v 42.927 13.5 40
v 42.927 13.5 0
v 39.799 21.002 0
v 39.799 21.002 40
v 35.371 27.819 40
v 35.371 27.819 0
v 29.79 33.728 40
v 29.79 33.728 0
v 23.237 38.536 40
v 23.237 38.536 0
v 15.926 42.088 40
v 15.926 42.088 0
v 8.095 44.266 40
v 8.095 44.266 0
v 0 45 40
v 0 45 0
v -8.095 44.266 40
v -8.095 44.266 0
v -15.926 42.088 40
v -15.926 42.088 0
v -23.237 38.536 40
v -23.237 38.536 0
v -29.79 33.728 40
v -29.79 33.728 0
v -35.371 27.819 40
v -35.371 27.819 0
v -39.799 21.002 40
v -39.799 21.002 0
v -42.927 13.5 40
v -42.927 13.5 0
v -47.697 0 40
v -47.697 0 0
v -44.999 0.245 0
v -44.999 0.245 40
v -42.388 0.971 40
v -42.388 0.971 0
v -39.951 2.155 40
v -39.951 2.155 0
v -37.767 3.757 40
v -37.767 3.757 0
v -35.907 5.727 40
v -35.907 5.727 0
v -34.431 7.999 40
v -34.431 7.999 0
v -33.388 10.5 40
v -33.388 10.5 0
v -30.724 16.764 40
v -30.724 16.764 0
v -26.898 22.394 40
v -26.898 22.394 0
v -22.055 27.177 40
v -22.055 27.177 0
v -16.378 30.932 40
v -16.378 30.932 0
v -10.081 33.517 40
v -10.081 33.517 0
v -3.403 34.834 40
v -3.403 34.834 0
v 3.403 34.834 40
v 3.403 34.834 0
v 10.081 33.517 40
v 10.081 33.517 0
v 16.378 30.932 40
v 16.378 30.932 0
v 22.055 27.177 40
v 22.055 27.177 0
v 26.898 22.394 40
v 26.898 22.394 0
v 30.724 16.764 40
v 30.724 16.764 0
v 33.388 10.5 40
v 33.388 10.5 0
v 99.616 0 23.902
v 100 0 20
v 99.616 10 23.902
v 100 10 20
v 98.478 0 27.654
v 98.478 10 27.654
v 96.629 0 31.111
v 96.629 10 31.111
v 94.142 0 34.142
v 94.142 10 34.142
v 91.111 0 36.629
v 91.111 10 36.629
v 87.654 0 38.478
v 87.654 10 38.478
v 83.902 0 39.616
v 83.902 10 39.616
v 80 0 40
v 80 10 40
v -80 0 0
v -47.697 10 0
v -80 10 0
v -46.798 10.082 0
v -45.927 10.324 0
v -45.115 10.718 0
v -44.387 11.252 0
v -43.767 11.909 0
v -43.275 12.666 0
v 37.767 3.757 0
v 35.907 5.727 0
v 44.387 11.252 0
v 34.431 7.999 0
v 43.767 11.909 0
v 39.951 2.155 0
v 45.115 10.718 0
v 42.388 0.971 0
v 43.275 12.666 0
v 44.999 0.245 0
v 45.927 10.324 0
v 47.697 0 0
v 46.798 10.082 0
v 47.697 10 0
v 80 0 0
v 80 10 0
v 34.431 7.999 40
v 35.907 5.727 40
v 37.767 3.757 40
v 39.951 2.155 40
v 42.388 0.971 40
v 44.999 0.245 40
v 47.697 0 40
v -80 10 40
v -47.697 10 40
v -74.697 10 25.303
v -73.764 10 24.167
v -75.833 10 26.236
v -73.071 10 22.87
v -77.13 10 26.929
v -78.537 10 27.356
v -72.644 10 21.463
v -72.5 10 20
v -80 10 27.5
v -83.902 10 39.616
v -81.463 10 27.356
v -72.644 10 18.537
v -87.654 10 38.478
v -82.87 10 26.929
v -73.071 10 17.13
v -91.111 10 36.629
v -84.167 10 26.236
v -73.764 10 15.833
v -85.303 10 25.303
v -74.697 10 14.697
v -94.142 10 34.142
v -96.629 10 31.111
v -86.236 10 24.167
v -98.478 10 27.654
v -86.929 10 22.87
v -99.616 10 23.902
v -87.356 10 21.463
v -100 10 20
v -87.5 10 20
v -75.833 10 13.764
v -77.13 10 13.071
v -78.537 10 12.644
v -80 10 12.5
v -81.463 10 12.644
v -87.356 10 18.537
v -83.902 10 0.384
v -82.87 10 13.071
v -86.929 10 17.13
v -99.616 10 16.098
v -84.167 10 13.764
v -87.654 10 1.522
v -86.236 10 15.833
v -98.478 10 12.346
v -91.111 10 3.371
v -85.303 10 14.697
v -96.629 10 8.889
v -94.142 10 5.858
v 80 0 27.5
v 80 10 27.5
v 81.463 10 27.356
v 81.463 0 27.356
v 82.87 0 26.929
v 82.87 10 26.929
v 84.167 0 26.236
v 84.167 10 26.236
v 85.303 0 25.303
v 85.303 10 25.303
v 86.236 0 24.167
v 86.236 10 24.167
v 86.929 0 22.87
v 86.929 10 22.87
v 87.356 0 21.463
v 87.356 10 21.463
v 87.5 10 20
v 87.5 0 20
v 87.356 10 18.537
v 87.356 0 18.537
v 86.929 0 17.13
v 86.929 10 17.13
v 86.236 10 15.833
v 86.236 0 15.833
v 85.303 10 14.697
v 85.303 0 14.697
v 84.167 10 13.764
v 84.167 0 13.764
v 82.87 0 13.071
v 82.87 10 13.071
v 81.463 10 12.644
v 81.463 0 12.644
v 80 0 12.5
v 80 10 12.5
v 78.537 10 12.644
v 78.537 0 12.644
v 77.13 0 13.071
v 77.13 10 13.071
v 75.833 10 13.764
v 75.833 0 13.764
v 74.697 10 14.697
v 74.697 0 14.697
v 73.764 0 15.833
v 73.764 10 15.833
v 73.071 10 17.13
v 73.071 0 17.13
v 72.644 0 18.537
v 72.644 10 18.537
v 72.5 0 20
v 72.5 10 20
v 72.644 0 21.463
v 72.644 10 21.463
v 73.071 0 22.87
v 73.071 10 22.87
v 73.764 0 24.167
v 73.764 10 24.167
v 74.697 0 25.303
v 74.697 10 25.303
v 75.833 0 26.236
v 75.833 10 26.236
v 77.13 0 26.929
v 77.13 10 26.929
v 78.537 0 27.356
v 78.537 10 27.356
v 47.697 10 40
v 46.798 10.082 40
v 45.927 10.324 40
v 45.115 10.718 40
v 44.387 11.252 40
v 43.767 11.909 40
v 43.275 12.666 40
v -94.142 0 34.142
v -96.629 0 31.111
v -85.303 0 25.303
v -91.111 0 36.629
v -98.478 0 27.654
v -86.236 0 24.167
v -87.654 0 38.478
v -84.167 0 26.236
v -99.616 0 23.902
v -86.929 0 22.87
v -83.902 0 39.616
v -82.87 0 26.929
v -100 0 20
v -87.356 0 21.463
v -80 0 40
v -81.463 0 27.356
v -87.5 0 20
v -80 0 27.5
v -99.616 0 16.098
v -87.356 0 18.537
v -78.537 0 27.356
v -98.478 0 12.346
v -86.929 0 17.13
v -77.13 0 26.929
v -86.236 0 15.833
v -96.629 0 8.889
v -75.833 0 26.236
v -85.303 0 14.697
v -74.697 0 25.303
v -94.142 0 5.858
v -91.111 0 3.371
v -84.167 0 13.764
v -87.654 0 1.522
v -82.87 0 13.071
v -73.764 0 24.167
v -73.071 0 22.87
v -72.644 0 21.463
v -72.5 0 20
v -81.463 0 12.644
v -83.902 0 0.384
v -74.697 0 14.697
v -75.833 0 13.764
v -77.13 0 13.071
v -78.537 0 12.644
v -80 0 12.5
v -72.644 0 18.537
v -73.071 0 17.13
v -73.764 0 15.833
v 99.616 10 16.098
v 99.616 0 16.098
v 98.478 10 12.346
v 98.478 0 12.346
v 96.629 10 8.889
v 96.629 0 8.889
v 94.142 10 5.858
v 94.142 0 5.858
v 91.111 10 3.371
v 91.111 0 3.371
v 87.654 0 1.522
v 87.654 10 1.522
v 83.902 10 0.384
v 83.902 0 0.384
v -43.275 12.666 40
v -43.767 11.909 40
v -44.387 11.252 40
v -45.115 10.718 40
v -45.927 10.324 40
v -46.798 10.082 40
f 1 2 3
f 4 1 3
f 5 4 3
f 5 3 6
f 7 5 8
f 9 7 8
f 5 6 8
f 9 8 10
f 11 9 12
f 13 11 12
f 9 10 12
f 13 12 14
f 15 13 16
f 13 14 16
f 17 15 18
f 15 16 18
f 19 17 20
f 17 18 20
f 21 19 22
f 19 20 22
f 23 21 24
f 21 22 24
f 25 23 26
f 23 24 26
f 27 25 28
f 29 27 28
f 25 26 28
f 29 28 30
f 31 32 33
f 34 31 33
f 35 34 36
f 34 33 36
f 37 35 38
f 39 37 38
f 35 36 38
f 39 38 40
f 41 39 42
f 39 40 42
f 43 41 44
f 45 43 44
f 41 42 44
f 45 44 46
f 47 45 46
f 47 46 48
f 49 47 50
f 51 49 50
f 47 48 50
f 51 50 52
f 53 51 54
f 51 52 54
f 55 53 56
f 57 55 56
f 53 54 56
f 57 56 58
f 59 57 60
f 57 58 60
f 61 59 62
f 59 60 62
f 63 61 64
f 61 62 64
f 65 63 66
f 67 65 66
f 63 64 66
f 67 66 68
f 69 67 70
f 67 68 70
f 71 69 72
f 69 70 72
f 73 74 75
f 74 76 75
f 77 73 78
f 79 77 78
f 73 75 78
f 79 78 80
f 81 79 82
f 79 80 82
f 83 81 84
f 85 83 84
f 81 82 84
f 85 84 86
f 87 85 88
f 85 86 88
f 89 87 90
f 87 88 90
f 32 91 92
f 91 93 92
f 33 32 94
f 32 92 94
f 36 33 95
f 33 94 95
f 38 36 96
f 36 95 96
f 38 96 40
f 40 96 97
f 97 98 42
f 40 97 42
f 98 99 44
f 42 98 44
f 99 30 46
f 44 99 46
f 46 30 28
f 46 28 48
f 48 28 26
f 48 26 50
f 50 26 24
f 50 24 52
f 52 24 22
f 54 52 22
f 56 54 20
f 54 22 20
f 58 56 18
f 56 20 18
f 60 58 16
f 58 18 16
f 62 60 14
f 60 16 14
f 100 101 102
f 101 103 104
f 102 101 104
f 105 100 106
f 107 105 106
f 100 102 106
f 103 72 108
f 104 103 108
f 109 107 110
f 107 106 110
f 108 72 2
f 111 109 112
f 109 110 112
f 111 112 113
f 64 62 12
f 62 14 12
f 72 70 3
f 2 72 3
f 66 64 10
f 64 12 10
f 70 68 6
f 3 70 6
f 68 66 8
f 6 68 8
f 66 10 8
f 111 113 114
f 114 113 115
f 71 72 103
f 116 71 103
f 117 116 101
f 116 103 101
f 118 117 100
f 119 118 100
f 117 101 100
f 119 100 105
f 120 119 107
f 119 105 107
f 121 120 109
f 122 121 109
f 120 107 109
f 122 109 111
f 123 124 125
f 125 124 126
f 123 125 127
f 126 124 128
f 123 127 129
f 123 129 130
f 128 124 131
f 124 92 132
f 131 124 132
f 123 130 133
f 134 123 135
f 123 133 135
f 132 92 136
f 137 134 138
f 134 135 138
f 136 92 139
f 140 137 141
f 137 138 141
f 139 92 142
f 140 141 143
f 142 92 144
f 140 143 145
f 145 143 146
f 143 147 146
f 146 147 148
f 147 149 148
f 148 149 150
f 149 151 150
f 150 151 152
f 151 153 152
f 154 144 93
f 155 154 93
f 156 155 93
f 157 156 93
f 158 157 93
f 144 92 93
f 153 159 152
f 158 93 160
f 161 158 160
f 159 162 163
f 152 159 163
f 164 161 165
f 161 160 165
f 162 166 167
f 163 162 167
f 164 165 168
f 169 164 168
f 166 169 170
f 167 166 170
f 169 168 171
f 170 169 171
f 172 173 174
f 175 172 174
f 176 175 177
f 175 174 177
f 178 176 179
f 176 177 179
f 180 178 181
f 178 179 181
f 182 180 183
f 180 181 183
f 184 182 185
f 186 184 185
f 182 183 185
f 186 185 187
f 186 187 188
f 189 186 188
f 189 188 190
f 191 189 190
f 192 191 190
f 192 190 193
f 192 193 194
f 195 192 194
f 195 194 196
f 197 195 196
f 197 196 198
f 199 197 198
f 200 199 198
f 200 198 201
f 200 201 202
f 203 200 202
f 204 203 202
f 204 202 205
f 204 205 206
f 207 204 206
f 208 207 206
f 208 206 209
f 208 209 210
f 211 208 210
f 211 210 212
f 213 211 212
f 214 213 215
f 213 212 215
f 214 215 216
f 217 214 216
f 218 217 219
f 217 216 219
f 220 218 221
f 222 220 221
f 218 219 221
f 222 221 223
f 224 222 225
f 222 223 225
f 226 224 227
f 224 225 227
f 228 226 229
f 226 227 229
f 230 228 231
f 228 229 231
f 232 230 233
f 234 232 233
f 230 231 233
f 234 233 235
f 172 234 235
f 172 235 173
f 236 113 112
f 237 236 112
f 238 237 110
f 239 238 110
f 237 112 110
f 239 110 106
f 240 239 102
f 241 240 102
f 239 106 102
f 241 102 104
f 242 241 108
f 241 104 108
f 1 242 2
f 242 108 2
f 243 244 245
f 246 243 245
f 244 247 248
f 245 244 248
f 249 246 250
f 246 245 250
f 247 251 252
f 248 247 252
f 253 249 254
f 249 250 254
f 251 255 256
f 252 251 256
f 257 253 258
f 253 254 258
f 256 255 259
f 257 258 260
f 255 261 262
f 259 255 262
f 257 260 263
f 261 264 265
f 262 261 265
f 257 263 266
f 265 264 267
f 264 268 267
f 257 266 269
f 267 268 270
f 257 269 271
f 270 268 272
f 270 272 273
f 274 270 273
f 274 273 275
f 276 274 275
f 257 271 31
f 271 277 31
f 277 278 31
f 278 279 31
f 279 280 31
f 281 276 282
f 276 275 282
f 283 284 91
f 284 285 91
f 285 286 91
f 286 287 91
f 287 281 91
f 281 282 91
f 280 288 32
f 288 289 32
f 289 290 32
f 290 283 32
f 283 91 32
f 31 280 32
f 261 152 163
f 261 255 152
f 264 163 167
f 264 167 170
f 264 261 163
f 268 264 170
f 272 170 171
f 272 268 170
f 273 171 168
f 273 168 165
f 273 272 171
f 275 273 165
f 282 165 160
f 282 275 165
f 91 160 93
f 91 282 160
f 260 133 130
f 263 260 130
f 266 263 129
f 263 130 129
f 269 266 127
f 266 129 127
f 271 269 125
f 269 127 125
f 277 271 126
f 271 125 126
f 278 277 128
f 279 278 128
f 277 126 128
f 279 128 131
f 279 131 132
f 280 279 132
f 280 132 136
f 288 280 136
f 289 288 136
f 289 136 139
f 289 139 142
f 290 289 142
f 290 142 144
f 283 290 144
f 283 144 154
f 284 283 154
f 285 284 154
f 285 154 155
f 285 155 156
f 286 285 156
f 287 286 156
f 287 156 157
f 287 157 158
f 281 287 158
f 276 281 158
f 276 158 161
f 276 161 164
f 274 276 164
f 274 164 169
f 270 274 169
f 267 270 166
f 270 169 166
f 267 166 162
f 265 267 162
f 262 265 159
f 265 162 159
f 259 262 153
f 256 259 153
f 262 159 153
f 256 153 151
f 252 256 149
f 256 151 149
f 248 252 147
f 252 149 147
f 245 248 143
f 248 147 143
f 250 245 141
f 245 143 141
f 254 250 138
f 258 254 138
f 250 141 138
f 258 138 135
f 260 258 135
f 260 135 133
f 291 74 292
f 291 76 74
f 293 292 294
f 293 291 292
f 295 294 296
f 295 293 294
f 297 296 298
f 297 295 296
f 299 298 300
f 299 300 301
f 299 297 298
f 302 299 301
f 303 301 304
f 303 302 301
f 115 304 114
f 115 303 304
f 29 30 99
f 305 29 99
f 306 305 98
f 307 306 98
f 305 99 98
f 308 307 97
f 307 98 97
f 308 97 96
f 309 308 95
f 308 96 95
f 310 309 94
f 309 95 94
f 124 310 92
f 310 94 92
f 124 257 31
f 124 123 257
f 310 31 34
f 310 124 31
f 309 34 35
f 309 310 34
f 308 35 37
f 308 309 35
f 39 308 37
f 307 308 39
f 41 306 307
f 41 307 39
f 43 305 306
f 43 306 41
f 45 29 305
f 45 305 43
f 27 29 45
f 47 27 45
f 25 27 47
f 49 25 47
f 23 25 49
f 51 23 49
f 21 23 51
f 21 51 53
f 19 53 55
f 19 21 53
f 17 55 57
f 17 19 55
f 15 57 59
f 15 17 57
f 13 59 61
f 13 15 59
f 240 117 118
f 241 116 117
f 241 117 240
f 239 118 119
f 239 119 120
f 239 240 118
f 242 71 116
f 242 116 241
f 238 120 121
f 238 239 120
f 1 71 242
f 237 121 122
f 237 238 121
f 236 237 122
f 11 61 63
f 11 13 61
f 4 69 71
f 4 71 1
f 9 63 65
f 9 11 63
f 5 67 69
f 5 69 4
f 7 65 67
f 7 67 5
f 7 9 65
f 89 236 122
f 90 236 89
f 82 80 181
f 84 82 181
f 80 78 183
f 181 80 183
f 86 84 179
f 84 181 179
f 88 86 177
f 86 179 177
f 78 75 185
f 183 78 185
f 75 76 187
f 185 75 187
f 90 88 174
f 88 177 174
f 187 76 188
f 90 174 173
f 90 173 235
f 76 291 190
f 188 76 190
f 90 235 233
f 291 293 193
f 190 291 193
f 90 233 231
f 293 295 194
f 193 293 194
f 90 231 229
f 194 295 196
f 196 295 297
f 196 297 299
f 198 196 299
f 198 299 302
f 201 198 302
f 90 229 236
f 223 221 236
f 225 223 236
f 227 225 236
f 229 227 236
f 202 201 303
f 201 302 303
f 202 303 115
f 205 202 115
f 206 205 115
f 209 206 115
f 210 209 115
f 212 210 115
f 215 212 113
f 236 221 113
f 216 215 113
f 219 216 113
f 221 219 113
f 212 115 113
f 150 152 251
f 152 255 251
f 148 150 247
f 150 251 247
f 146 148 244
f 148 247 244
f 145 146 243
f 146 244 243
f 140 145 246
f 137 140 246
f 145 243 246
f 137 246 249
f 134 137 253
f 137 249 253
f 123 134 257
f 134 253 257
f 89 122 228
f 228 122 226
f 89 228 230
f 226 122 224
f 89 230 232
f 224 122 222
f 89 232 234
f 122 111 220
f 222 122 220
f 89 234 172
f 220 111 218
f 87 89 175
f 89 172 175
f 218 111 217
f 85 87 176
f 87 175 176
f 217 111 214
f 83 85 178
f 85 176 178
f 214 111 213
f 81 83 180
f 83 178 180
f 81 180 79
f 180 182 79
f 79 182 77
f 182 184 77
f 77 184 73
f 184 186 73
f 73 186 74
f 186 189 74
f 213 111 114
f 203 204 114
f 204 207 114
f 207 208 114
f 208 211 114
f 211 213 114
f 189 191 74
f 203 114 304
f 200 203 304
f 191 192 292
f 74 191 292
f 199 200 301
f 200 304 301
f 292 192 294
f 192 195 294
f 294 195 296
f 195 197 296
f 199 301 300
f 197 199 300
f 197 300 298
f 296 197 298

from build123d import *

# Parameters (mm, degrees)
BOSS_EXTRUDE1_DEPTH = 40
FILLET1_R           = 20
SKETCH2_R           = 7.5
CUT_EXTRUDE1_DEPTH  = 114.247516529


with BuildPart() as part:
    # Sketch1 → Boss-Extrude1 (new body)
    with BuildSketch(Plane.XY):
        with BuildLine():
            Line((-100, 0), (-47.696960071, 0))
            ThreePointArc((-47.696960071, 0), (-38.822840396, 2.906613378), (-33.38787205, 10.5))
            ThreePointArc((-33.38787205, 10.5), (0, 35), (33.38787205, 10.5))
            ThreePointArc((33.38787205, 10.5), (38.822840396, 2.906613378), (47.696960071, 0))
            Line((47.696960071, 0), (100, 0))
            Line((100, 0), (100, 10))
            Line((100, 10), (47.696960071, 10))
            ThreePointArc((47.696960071, 10), (44.738920179, 10.968871126), (42.927264064, 13.5))
            ThreePointArc((42.927264064, 13.5), (0, 45), (-42.927264064, 13.5))
            ThreePointArc((-42.927264064, 13.5), (-44.738920179, 10.968871126), (-47.696960071, 10))
            Line((-47.696960071, 10), (-100, 10))
            Line((-100, 10), (-100, 0))
        make_face()
    extrude(amount=BOSS_EXTRUDE1_DEPTH)

    # Fillet1
    fillet1_edges = [part.edges().sort_by_distance(p)[0] for p in [
        (100, 5, 0),
        (100, 5, 40),
        (-100, 5, 0),
        (-100, 5, 40),
    ]]
    fillet(fillet1_edges, radius=FILLET1_R - 0.0001)  # a hair under: the kernel refuses the full size

    # Sketch2 → Cut-Extrude1 (cut, through all)
    with BuildSketch(Plane(origin=(0, 10, 0), x_dir=(1, 0, 0), z_dir=(0, 1, 0))):
        with Locations(Location((-80, -20, 0), (0, 0, 270))):
            Circle(SKETCH2_R)
        with Locations(Location((80, -20, 0), (0, 0, 270))):
            Circle(SKETCH2_R)
    extrude(amount=-CUT_EXTRUDE1_DEPTH, mode=Mode.SUBTRACT)


solid = part.part
